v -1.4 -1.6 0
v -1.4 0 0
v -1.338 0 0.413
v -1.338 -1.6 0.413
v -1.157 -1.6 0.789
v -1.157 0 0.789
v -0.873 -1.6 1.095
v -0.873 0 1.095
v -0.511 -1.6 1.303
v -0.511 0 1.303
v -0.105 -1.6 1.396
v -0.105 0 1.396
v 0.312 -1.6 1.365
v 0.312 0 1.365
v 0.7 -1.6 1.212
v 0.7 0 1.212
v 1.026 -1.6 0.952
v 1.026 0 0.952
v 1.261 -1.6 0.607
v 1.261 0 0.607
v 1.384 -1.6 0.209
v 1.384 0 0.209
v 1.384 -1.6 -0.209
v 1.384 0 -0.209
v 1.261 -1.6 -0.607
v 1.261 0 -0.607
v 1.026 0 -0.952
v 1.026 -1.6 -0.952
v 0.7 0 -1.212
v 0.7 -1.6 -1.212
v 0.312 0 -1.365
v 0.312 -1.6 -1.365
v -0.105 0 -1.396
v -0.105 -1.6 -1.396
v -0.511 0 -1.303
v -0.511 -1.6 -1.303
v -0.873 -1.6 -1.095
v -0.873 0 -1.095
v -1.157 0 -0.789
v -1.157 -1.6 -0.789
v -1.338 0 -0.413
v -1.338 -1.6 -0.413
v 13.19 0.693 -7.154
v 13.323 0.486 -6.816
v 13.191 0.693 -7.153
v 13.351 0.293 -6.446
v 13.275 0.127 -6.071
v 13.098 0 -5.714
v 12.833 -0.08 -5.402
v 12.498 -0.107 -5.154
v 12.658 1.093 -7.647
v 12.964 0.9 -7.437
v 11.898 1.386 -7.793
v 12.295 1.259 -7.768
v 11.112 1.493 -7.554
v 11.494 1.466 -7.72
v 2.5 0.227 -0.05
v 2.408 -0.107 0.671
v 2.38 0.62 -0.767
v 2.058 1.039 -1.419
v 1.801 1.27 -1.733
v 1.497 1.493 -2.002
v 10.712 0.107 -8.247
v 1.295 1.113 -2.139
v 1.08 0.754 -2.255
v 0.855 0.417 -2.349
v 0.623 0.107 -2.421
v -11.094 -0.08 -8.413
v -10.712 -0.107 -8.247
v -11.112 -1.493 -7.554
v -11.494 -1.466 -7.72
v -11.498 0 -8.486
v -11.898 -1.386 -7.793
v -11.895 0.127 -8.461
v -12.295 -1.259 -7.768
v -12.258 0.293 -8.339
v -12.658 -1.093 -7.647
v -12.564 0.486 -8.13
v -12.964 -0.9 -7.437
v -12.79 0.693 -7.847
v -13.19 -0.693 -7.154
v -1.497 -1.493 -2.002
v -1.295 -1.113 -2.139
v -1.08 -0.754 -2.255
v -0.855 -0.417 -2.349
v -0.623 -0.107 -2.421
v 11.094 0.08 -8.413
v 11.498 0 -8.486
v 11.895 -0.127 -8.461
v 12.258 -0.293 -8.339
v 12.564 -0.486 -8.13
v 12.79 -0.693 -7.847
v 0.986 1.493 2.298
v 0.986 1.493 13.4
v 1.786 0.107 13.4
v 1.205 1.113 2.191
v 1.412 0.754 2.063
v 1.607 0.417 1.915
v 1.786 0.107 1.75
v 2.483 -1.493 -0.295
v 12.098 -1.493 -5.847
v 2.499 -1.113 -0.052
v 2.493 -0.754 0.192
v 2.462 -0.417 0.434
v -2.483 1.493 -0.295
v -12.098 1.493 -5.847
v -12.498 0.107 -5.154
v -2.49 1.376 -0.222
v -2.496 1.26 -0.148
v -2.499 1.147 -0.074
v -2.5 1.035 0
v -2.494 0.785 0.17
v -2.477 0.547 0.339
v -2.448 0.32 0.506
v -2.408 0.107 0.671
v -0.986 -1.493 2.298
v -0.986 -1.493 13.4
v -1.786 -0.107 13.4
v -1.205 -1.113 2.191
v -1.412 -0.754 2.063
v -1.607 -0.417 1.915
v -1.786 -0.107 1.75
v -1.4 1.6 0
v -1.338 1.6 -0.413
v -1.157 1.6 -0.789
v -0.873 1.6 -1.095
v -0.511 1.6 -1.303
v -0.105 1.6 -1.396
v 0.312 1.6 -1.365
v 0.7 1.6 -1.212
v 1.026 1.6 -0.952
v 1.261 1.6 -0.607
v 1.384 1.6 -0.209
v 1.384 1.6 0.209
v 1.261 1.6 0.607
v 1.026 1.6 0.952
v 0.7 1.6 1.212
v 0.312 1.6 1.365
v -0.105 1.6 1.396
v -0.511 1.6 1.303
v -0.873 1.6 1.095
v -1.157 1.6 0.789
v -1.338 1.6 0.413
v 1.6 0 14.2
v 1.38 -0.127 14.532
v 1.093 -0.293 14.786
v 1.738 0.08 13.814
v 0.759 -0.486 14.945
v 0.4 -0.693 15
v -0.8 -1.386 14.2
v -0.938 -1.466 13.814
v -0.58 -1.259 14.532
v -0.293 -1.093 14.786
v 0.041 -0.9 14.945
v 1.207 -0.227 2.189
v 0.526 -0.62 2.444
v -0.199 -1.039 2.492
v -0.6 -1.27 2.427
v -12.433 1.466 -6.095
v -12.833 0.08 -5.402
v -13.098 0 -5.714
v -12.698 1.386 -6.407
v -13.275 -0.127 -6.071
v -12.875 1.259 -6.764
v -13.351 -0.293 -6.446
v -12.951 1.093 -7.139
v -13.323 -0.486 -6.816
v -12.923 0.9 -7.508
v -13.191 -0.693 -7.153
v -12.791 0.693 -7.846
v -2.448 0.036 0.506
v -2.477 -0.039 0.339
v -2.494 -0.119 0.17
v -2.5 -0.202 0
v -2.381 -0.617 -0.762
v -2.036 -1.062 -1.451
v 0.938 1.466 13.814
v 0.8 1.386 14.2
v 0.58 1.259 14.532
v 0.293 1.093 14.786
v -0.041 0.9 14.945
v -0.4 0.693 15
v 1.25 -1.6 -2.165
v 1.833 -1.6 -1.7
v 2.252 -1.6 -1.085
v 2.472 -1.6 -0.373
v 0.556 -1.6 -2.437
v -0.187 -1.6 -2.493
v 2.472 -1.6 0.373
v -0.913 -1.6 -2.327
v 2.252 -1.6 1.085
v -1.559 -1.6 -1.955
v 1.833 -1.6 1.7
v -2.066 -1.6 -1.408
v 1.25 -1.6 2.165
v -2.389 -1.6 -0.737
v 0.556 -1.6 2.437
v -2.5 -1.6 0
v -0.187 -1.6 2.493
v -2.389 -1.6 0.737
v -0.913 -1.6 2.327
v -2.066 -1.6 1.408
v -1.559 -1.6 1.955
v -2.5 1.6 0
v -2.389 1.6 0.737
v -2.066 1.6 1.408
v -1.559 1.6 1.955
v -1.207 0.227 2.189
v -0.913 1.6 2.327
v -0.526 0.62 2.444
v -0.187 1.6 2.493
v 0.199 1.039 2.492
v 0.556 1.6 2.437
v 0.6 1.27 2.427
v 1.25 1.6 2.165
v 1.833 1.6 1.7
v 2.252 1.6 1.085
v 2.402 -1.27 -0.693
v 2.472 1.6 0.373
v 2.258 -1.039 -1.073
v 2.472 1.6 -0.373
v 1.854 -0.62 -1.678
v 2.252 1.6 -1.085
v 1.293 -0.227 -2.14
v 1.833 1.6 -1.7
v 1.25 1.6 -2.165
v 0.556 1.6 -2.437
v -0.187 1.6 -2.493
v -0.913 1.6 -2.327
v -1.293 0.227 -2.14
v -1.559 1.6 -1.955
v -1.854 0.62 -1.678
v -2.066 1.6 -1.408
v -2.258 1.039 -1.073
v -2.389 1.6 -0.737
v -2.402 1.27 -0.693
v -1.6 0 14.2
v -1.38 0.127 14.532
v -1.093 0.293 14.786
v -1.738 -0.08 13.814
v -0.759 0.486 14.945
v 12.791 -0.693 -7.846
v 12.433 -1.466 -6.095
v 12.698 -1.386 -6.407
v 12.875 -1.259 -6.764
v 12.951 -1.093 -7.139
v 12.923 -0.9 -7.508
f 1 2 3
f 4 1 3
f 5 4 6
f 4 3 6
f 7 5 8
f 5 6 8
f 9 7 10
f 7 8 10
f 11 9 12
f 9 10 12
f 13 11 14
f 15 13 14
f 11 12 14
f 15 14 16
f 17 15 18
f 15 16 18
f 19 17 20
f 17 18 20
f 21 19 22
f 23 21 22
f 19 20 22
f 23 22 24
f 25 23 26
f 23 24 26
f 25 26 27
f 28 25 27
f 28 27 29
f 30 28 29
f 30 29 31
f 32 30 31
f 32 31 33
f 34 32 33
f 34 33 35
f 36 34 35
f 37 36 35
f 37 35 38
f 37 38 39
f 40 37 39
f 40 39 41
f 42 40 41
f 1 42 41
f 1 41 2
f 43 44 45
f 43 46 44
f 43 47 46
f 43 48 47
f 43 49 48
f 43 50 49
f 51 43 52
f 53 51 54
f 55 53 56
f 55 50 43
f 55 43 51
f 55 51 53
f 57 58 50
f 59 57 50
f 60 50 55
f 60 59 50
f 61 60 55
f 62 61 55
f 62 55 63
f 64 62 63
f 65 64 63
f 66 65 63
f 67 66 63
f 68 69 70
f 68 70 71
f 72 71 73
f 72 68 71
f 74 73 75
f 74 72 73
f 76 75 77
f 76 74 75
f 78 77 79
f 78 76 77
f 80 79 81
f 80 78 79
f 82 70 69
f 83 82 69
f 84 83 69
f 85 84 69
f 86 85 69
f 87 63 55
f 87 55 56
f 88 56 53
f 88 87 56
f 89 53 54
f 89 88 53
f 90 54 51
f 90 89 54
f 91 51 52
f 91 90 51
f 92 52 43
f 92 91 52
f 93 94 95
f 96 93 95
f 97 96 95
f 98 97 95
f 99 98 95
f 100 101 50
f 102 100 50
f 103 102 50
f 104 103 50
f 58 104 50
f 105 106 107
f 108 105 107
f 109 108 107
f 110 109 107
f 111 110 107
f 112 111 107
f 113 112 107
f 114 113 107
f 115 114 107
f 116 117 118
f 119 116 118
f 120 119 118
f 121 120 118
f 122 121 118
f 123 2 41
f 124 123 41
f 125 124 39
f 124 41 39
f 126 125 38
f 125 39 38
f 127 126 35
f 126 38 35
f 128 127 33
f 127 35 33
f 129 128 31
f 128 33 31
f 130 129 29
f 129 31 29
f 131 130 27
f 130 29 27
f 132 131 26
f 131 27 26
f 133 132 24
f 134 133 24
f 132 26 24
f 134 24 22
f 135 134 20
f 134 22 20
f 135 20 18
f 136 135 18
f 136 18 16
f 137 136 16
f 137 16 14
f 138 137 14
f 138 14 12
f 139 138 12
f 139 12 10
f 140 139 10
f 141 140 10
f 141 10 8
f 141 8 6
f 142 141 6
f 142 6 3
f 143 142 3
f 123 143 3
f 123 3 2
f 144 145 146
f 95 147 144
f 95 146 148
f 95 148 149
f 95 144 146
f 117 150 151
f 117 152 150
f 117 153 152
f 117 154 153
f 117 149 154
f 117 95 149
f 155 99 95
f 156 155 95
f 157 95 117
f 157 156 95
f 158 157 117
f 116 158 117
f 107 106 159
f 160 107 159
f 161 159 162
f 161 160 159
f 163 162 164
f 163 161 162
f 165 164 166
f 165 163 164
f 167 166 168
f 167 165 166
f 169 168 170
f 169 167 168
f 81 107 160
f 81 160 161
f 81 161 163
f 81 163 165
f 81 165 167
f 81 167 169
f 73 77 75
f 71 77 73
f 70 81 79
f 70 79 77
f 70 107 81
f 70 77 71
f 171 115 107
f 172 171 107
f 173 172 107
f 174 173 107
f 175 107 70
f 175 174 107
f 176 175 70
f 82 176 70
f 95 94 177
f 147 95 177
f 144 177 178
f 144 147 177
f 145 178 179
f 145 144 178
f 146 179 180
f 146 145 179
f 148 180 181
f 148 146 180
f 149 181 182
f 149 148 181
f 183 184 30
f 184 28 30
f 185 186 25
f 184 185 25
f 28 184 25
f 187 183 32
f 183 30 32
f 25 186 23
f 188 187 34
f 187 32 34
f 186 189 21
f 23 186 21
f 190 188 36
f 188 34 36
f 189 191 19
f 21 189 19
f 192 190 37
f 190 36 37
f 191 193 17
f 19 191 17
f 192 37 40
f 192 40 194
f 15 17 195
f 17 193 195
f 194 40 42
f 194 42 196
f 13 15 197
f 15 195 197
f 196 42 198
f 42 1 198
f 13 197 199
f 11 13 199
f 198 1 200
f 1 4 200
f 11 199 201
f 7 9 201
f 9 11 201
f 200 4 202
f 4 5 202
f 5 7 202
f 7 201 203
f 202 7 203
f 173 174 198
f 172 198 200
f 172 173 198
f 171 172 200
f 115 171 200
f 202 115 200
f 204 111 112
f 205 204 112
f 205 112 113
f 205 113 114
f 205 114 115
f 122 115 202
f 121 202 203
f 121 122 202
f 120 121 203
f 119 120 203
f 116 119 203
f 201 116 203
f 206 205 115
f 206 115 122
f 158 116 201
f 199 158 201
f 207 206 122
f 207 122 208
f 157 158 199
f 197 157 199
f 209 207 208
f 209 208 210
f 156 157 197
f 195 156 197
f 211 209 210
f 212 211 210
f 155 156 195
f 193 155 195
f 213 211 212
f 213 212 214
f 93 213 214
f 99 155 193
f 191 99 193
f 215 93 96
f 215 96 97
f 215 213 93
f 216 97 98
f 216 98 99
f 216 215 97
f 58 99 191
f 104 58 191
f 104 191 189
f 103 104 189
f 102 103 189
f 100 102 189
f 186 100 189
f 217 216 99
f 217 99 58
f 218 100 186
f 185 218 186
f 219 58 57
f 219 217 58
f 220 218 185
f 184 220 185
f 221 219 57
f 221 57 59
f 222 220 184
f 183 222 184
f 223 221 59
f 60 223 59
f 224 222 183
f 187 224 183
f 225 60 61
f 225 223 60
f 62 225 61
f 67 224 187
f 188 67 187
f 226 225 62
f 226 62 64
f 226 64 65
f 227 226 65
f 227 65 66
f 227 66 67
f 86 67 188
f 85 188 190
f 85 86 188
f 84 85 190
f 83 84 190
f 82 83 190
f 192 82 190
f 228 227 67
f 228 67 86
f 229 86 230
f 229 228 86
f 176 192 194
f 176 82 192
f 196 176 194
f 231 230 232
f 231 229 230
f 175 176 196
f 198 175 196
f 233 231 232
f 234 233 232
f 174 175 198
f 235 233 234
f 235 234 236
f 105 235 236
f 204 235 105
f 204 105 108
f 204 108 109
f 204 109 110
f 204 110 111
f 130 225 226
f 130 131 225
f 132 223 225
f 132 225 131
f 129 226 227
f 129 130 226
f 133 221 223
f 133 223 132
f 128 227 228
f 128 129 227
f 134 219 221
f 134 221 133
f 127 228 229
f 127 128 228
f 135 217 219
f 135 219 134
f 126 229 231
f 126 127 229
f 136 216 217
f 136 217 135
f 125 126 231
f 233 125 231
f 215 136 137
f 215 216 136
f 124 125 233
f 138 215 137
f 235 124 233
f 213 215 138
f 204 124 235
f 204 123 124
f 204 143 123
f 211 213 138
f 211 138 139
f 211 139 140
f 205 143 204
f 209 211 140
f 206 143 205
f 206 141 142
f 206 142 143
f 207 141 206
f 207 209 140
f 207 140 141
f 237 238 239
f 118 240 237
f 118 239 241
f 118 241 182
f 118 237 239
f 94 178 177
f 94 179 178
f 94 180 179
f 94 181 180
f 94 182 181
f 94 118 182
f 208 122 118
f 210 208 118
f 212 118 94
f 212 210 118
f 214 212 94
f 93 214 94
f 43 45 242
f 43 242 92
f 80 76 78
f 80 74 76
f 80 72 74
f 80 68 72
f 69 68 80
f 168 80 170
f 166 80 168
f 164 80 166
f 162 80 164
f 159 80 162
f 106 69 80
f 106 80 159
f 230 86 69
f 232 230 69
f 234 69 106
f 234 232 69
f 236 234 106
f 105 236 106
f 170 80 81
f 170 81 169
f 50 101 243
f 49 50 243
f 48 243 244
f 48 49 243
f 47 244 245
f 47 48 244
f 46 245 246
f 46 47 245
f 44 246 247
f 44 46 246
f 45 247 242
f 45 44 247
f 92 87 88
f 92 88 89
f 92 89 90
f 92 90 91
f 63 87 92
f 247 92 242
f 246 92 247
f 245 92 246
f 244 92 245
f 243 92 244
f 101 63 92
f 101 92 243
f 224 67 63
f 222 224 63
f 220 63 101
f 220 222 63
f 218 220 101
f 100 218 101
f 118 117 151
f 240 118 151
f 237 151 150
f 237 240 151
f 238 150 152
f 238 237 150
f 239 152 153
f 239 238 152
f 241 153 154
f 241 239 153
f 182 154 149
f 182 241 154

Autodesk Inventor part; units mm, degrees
ref_plane "YZ Plane" through (0, 0, 0) normal (1, 0, 0) x (0, 1, 0)
ref_plane "XZ Plane" through (0, 0, 0) normal (0, 1, 0) x (-1, 0, 0)
ref_plane "XY Plane" through (0, 0, 0) normal (0, 0, 1) x (1, 0, 0)
sketch "Sketch2" plane through (0, 0, 0) normal (0, 1, 0) x (-1, 0, 0)
  circle A0 centre (0, 0) radius 2.5
  circle A1 centre (0, 0) radius 1.4
  dimension "d9" = 5
  dimension "d10" = 2.8
sketch "Sketch1" plane through (0, 0, 0) normal (0, 0, 1) x (1, 0, 0)
  line L0 (-1.7856, -0.1072) -> (0.9856, 1.4928)
  line L1 (0.9856, 1.4928) -> (1.7856, 0.1072)
  line L2 (1.7856, 0.1072) -> (-0.9856, -1.4928)
  line L3 (-0.9856, -1.4928) -> (-1.7856, -0.1072)
  line L4 (0.9856, 1.4928) -> (-0.9856, -1.4928) construction
  line L5 (0, -2.0899) -> (0, 2.0899) construction
  line L6 (-2.4999, 0) -> (2.4999, 0) construction
  point P0 (0, 0)
  dimension "d0" = 1.6
  dimension "d1" = 3.2
  dimension "d2" = 30
extrude "Extrusion1" add sketch "Sketch1" along normal blind 15
fillet "Fillet1" radius 1.6 2 edges at (1.3856, 0.8, 15) (-1.3856, -0.8, 15)
pattern_circular "Circular Pattern1" count 3 over 360 about axis through (0, -10, 0) along (0, 1, 0) of "Extrusion1", "Fillet1"
extrude "Extrusion2" add sketch "Sketch2" along normal mid plane 3.2 contours A0 | A1
extrude "Extrusion3" cut sketch "Sketch2" along normal through all both and the other way through all contours A1
equation "\"d5\" = 0.5 * d1"
properties part number "LEGO Brick 2421" material "Steel"
